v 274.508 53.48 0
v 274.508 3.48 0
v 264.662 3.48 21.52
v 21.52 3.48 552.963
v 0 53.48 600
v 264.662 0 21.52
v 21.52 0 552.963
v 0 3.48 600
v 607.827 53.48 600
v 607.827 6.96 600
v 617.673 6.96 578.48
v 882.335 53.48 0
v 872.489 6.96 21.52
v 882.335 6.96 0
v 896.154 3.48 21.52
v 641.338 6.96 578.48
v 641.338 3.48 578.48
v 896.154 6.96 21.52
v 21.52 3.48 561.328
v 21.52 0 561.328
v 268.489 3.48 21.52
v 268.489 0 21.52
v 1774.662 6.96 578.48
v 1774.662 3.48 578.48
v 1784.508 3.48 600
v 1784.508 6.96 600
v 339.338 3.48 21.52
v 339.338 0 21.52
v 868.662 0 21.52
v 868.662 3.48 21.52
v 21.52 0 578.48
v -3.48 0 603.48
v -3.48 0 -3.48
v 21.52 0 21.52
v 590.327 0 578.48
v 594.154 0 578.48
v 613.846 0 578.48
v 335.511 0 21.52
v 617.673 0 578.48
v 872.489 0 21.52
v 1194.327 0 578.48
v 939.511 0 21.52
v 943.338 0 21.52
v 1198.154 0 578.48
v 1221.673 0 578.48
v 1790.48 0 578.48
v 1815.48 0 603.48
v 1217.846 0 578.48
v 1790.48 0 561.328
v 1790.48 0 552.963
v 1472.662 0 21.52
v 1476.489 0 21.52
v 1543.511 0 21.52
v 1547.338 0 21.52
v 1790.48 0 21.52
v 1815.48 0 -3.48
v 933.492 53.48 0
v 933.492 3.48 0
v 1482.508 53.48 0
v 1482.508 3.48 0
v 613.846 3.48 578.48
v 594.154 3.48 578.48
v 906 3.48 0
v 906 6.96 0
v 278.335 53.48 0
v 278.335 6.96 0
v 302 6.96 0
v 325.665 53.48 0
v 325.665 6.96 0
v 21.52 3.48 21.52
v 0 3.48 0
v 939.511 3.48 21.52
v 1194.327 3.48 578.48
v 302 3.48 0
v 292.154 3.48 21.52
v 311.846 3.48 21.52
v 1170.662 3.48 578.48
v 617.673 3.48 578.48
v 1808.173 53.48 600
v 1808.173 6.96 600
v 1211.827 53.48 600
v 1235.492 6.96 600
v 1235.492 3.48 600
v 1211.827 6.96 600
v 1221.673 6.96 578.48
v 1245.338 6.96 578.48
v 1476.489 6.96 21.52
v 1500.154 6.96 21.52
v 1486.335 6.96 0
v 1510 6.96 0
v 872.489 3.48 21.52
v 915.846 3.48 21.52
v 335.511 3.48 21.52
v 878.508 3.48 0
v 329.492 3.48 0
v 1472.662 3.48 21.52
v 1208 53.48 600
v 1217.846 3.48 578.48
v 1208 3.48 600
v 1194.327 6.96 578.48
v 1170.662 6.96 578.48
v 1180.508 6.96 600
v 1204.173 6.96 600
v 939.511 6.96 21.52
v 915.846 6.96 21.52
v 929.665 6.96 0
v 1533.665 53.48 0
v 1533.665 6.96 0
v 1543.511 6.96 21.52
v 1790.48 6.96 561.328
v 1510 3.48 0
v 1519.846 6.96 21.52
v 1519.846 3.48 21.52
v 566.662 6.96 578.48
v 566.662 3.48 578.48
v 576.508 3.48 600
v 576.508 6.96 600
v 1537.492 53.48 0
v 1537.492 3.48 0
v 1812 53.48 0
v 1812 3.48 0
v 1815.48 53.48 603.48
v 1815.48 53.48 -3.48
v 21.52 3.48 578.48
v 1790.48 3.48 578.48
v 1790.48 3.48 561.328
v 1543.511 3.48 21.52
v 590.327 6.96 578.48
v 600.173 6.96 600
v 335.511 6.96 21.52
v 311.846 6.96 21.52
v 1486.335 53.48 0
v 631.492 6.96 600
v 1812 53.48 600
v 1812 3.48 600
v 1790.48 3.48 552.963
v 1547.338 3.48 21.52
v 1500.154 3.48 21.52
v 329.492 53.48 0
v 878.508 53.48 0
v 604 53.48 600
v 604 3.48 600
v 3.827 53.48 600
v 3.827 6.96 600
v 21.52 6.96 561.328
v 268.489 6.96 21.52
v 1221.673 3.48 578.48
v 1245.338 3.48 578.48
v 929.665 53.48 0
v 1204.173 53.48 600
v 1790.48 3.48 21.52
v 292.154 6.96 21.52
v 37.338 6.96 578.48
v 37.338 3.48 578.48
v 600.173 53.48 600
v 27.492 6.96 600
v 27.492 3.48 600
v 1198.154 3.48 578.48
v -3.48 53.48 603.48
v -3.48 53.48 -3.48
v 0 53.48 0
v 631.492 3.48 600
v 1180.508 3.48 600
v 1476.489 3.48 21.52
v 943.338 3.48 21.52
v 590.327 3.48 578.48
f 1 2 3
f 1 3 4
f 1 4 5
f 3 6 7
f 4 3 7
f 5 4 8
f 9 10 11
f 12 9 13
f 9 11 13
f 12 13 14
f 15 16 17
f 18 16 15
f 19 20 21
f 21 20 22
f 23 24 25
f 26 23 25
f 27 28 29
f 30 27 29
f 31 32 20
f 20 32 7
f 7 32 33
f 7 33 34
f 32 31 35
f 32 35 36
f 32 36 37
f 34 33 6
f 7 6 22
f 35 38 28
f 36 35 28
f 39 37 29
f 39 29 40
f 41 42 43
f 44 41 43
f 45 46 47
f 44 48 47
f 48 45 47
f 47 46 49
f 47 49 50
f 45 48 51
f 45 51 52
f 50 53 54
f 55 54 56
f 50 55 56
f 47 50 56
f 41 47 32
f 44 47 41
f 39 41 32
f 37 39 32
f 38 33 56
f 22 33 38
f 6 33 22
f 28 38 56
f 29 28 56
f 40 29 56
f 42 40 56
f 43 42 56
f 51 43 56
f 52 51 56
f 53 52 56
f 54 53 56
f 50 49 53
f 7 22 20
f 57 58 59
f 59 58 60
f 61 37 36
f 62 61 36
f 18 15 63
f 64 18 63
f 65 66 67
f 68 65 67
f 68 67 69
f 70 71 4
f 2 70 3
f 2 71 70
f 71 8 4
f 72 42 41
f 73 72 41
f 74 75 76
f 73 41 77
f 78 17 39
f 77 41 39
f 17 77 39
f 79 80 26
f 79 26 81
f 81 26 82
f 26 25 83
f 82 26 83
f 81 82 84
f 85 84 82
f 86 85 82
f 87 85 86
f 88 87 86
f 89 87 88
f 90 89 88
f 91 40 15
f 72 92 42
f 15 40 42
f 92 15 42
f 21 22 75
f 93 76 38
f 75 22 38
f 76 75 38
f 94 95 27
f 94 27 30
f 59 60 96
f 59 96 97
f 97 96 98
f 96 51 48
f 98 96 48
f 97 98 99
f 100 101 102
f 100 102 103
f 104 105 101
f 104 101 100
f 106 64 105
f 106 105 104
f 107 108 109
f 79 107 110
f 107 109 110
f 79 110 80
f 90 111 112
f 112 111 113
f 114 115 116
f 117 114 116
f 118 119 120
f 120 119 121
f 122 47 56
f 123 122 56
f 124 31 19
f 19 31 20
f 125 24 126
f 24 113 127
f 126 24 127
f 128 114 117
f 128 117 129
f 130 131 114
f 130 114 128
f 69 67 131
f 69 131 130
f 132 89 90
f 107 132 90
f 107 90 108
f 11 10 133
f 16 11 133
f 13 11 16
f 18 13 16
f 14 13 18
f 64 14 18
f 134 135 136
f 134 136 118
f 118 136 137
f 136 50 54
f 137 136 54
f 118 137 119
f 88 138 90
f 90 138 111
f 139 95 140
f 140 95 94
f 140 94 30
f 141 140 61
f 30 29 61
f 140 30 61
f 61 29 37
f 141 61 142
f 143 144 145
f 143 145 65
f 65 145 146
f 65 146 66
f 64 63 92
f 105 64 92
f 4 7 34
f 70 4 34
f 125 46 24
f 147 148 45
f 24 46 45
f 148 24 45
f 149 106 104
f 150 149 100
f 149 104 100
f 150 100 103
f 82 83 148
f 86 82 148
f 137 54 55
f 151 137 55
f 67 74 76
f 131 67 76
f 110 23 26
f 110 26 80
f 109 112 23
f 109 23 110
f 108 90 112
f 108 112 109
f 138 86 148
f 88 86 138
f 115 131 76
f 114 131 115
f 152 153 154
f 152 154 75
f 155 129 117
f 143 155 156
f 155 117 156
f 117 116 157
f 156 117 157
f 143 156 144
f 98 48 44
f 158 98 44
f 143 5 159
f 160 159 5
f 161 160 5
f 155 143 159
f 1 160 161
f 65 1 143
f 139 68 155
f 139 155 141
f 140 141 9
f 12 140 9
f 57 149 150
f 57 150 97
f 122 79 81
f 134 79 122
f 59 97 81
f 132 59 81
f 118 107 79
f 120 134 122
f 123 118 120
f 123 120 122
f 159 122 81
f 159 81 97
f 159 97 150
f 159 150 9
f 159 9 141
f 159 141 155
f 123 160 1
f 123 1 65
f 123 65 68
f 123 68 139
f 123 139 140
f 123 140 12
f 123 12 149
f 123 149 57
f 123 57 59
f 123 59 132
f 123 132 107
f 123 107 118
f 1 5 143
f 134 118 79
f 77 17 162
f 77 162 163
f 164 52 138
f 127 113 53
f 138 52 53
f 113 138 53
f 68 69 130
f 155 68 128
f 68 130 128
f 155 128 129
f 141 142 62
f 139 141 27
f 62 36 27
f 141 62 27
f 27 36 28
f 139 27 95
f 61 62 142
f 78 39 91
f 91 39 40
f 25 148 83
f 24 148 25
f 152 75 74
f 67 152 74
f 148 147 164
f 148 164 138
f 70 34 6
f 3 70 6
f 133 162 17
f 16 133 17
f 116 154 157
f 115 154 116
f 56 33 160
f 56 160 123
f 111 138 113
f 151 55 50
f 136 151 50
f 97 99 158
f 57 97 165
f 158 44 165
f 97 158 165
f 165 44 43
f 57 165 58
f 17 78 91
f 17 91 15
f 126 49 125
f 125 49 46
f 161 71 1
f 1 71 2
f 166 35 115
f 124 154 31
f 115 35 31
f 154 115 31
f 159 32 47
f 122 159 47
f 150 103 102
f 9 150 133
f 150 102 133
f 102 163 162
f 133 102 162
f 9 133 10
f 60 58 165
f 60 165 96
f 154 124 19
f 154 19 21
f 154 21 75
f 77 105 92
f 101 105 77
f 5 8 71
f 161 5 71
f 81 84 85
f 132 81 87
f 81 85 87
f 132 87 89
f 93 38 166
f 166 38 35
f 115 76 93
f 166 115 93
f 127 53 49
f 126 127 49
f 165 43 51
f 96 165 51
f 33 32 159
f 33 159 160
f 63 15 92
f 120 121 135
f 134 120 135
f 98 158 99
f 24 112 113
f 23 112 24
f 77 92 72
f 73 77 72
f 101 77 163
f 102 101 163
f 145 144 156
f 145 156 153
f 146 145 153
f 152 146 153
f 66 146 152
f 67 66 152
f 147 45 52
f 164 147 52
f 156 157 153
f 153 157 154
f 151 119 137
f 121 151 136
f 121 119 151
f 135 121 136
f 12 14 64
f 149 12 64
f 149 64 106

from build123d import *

# Parameters (mm, degrees)
SKETCH1_W            = 1818.96
SKETCH1_H            = 606.96
BOSS_EXTRUDE2_DEPTH  = 53.48
BOSS_EXTRUDE9_DEPTH  = 3.48
BOSS_EXTRUDE10_DEPTH = 6.96
BOSS_EXTRUDE11_START = 6.96
BOSS_EXTRUDE11_DEPTH = 3.48


with BuildPart() as part:
    # Sketch1 → Boss-Extrude2 (new body)
    with BuildSketch(Plane(origin=(0, 0, 0), x_dir=(1, 0, 0), z_dir=(0, 1, 0))):
        with Locations((906, -300)):
            Rectangle(SKETCH1_W, SKETCH1_H)
        Polygon((274.507750304, 0), (0, -600), (0, 0), align=None, mode=Mode.SUBTRACT)
        Polygon((3.826921158, -600), (278.334671461, 0), (325.665328539, 0), (600.173078842, -600), align=None, mode=Mode.SUBTRACT)
        Polygon((607.826921158, -600), (882.334671461, 0), (929.665328539, 0), (1204.173078842, -600), align=None, mode=Mode.SUBTRACT)
        Polygon((1211.826921158, -600), (1486.334671461, 0), (1533.665328539, 0), (1808.173078842, -600), align=None, mode=Mode.SUBTRACT)
        Polygon((1812, 0), (1812, -600), (1537.492249696, 0), align=None, mode=Mode.SUBTRACT)
        Polygon((933.492249696, 0), (1482.507750304, 0), (1208, -600), align=None, mode=Mode.SUBTRACT)
        Polygon((329.492249696, 0), (878.507750304, 0), (604, -600), align=None, mode=Mode.SUBTRACT)
    extrude(amount=BOSS_EXTRUDE2_DEPTH)

    # Sketch1<7> → Boss-Extrude9 (add)
    with BuildSketch(Plane(origin=(0, 0, 0), x_dir=(1, 0, 0), z_dir=(0, 1, 0))):
        Polygon((37.337927674, -578.48), (27.492249696, -600), (576.507750304, -600), (566.662072326, -578.48), align=None)
        Polygon((274.507750304, 0), (0, 0), (0, -600), (21.52, -552.963076686), (21.52, -21.52), (264.662072326, -21.52), align=None)
        Polygon((641.337927674, -578.48), (631.492249696, -600), (1180.507750304, -600), (1170.662072326, -578.48), align=None)
        Polygon((1245.337927674, -578.48), (1235.492249696, -600), (1784.507750304, -600), (1774.662072326, -578.48), align=None)
        Polygon((1812, 0), (1537.492249696, 0), (1547.337927674, -21.52), (1790.48, -21.52), (1790.48, -552.963076686), (1812, -600), align=None)
        Polygon((1198.154322022, -578.48), (1208, -600), (1217.845677978, -578.48), align=None)
        Polygon((594.154322022, -578.48), (604, -600), (613.845677978, -578.48), align=None)
        Polygon((1482.507750304, 0), (933.492249696, 0), (943.337927674, -21.52), (1472.662072326, -21.52), align=None)
        Polygon((1519.845677978, -21.52), (1510, 0), (1500.154322022, -21.52), align=None)
        Polygon((915.845677978, -21.52), (906, 0), (896.154322022, -21.52), align=None)
        Polygon((878.507750304, 0), (329.492249696, 0), (339.337927674, -21.52), (868.662072326, -21.52), align=None)
        Polygon((311.845677978, -21.52), (302, 0), (292.154322022, -21.52), align=None)
    extrude(amount=BOSS_EXTRUDE9_DEPTH)

    # Sketch1<9> → Boss-Extrude10 (add)
    with BuildSketch(Plane(origin=(0, 0, 0), x_dir=(1, 0, 0), z_dir=(0, 1, 0))):
        Polygon((1774.662072326, -578.48), (1784.507750304, -600), (1808.173078842, -600), (1790.48, -561.327695507), (1790.48, -578.48), align=None)
        Polygon((1221.672599135, -578.48), (1211.826921158, -600), (1235.492249696, -600), (1245.337927674, -578.48), align=None)
        Polygon((1170.662072326, -578.48), (1180.507750304, -600), (1204.173078842, -600), (1194.327400865, -578.48), align=None)
        Polygon((617.672599135, -578.48), (607.826921158, -600), (631.492249696, -600), (641.337927674, -578.48), align=None)
        Polygon((566.662072326, -578.48), (576.507750304, -600), (600.173078842, -600), (590.327400865, -578.48), align=None)
        Polygon((21.52, -561.327695507), (3.826921158, -600), (27.492249696, -600), (37.337927674, -578.48), (21.52, -578.48), align=None)
        Polygon((302, 0), (278.334671461, 0), (268.488993484, -21.52), (292.154322022, -21.52), align=None)
        Polygon((325.665328539, 0), (302, 0), (311.845677978, -21.52), (335.511006516, -21.52), align=None)
        Polygon((929.665328539, 0), (906, 0), (915.845677978, -21.52), (939.511006516, -21.52), align=None)
        Polygon((906, 0), (882.334671461, 0), (872.488993484, -21.52), (896.154322022, -21.52), align=None)
        Polygon((1533.665328539, 0), (1510, 0), (1519.845677978, -21.52), (1543.511006516, -21.52), align=None)
        Polygon((1510, 0), (1486.334671461, 0), (1476.488993484, -21.52), (1500.154322022, -21.52), align=None)
    extrude(amount=BOSS_EXTRUDE10_DEPTH)

    # Sketch1<10> → Boss-Extrude11 (add)
    with BuildSketch(Plane(origin=(0, 0, 0), x_dir=(1, 0, 0), z_dir=(0, 1, 0)).offset(BOSS_EXTRUDE11_START)):
        Polygon((292.154322022, -21.52), (268.488993484, -21.52), (21.52, -561.327695507), (21.52, -578.48), (37.337927674, -578.48), align=None)
        Polygon((335.511006516, -21.52), (311.845677978, -21.52), (566.662072326, -578.48), (590.327400865, -578.48), align=None)
        Polygon((896.154322022, -21.52), (872.488993484, -21.52), (617.672599135, -578.48), (641.337927674, -578.48), align=None)
        Polygon((939.511006516, -21.52), (915.845677978, -21.52), (1170.662072326, -578.48), (1194.327400865, -578.48), align=None)
        Polygon((1500.154322022, -21.52), (1476.488993484, -21.52), (1221.672599135, -578.48), (1245.337927674, -578.48), align=None)
        Polygon((1543.511006516, -21.52), (1519.845677978, -21.52), (1774.662072326, -578.48), (1790.48, -578.48), (1790.48, -561.327695507), align=None)
    extrude(amount=-BOSS_EXTRUDE11_DEPTH)


solid = part.part
